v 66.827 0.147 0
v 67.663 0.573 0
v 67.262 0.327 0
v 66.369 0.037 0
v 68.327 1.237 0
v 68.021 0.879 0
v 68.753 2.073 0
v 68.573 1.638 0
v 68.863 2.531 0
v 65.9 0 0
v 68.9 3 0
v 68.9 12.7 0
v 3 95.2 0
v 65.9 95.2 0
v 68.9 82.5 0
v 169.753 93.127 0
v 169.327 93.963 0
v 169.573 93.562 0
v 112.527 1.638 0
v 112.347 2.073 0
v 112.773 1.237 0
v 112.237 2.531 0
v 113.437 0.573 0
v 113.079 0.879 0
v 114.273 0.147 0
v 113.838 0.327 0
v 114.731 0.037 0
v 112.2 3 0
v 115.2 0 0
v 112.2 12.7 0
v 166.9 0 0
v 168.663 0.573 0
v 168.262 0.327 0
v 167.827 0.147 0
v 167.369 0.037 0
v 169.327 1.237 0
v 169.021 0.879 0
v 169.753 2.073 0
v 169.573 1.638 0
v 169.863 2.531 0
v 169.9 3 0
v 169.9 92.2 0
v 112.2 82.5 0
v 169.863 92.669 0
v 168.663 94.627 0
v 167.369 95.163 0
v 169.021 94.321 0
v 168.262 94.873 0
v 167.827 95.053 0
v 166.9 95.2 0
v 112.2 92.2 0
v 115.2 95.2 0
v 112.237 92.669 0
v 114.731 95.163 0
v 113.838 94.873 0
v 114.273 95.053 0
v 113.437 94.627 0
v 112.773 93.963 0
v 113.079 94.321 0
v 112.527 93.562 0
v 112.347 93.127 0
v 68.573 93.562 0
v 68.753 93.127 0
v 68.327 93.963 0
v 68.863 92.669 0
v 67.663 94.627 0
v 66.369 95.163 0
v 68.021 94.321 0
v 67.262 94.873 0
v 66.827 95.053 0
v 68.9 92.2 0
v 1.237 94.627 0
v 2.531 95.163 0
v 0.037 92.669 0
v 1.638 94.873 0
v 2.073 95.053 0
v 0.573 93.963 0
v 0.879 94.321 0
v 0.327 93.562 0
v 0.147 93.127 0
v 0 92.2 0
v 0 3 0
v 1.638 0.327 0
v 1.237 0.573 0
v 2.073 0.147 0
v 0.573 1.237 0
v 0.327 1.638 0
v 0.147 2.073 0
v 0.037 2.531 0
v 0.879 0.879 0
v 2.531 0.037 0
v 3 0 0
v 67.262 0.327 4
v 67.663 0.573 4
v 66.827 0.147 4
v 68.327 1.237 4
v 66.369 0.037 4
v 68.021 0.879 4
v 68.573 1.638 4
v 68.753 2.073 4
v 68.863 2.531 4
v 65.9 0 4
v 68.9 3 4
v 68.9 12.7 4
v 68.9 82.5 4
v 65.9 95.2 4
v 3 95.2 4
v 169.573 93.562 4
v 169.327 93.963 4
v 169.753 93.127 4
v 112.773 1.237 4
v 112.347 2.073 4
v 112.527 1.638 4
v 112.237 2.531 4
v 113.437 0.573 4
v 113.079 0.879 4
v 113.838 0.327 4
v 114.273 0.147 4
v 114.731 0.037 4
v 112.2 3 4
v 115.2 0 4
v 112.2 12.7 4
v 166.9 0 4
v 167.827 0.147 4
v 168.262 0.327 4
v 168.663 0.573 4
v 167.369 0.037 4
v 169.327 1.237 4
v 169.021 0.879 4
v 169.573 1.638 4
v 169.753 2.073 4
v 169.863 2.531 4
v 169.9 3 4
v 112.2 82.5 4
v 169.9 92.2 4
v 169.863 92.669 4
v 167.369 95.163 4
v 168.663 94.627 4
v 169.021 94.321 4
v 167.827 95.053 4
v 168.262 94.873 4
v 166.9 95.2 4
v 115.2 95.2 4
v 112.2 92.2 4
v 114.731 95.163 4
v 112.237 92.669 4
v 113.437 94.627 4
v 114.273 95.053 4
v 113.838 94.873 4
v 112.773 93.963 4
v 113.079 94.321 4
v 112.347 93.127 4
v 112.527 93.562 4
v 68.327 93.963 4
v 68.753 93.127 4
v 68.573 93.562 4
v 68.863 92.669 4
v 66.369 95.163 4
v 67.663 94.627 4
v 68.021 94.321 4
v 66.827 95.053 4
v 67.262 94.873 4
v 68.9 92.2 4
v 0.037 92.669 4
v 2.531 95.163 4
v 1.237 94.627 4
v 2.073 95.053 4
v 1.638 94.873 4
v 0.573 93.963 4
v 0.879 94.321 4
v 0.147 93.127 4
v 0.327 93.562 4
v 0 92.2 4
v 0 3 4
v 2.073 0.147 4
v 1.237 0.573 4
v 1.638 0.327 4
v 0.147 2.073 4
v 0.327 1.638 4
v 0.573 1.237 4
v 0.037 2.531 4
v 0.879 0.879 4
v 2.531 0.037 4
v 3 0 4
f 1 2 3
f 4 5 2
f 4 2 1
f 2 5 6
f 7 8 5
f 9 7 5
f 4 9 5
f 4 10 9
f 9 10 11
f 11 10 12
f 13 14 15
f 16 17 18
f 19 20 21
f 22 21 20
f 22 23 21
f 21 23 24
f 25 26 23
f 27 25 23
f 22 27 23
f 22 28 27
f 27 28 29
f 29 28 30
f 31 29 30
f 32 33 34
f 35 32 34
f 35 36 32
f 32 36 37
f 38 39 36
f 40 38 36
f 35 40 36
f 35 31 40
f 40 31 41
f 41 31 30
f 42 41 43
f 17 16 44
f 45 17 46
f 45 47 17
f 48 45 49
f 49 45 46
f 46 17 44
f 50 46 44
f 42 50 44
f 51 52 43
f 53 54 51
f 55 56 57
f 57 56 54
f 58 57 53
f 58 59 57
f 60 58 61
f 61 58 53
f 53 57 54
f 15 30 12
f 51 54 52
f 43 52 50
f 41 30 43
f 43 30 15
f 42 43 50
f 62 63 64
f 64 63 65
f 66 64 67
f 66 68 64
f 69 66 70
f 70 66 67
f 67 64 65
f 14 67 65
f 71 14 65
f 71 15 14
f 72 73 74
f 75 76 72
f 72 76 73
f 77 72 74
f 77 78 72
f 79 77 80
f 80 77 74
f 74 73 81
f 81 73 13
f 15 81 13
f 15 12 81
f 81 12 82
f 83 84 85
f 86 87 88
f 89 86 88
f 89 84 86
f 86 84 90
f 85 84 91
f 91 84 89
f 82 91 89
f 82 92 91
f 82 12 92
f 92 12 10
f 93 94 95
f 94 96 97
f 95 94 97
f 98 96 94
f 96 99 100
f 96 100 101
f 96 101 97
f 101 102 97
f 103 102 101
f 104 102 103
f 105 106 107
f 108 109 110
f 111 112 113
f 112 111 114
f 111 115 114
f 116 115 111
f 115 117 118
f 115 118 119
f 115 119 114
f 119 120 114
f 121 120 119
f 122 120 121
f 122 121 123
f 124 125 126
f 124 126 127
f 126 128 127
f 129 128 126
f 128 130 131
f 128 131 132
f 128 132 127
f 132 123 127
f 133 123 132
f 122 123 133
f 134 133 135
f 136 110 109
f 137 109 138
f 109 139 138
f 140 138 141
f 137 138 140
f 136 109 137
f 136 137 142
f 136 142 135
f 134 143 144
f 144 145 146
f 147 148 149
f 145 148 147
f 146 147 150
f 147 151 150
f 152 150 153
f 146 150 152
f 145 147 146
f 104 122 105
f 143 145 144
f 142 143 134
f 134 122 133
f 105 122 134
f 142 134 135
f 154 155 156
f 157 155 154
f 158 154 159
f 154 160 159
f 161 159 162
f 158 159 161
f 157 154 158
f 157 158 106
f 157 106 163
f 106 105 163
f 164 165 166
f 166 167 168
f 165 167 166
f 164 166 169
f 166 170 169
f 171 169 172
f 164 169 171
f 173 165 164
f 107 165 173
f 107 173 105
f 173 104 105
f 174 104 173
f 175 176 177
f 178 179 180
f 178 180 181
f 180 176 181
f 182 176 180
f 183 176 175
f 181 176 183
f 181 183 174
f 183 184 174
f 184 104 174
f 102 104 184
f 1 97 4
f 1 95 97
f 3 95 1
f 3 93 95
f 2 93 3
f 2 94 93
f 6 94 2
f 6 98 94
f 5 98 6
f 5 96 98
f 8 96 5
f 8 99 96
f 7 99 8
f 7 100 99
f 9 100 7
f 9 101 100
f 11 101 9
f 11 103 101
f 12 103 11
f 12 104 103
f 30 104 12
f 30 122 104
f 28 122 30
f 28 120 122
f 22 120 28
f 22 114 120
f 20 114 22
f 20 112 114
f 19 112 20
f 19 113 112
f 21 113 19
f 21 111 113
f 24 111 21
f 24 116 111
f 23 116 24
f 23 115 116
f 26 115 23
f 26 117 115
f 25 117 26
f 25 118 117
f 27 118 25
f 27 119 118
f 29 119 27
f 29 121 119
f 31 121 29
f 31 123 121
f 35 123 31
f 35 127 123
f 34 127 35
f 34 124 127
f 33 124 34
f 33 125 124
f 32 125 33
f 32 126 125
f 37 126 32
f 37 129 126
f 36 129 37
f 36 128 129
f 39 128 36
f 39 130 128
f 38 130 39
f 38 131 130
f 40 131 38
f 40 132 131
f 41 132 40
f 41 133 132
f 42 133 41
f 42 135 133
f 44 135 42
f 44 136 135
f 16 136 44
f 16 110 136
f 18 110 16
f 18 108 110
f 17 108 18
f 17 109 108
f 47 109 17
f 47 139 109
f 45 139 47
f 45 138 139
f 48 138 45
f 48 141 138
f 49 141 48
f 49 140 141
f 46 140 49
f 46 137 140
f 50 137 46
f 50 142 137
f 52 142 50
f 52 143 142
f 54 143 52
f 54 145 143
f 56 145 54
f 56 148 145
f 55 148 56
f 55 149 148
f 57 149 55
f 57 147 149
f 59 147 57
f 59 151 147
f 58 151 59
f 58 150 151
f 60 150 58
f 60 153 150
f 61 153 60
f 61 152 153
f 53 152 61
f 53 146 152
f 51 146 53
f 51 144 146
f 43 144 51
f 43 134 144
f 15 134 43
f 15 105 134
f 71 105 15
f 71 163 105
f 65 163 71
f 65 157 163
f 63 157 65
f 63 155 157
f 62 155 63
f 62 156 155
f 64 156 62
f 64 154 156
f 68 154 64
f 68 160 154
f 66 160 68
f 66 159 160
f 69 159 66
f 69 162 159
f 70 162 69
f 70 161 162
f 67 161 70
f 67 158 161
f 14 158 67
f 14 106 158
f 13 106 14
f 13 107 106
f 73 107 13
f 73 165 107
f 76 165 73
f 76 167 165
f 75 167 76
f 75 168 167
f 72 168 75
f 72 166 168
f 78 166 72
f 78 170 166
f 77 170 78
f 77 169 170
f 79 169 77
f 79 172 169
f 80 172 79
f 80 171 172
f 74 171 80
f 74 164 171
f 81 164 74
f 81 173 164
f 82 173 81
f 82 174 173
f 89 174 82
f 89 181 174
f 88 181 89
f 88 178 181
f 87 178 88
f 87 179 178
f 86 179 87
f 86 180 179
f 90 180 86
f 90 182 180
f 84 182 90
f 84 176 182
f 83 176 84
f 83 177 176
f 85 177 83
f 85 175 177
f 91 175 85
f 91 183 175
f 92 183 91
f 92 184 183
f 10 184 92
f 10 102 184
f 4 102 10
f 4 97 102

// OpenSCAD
$fn = 40;

// ============================================================
// BASE PLATE DIMENSIONS
// ============================================================
part_outer_width = 95.2;
part_inner_width = 69.8;

part_left_length_raw   = 69.9;
part_center_length_raw = 41.3;
part_right_length_raw  = 58.7;

left_trim  = 1;
right_trim = 1;

part_left_length  = part_left_length_raw  - left_trim;
part_right_length = part_right_length_raw - right_trim;

part_total_length = part_left_length_raw + part_center_length_raw + part_right_length_raw;
part_center_length = part_total_length - part_left_length - part_right_length;

// ============================================================
// CORNER ROUNDING
// ============================================================
profile_corner_radius = 3;

// ============================================================
// FOOTPRINTS / SECTION PLACEMENT
// ============================================================
left_section_size   = [part_left_length, part_outer_width];
right_section_size  = [part_right_length, part_outer_width];
center_section_size = [part_center_length, part_inner_width];

center_section_x = left_section_size[0];
center_section_y_offset = (part_outer_width - part_inner_width) / 2;
right_section_x = left_section_size[0] + center_section_size[0];

// ============================================================
// 2D HELPERS
// ============================================================
module rect_2d(sz) {
    square(sz, center = false);
}

module rounded_shape_2d(r) {
    offset(r = r)
        offset(delta = -r)
            children();
}

// ============================================================
// 2D BASE PROFILE
// ============================================================
module base_profile_2d() {
    union() {
        rect_2d(left_section_size);

        translate([center_section_x, center_section_y_offset])
            rect_2d(center_section_size);

        translate([right_section_x, 0])
            rect_2d(right_section_size);
    }
}

module rounded_base_profile_2d(r = profile_corner_radius) {
    rounded_shape_2d(r)
        base_profile_2d();
}

// ============================================================
// 3D BASE PLATE
// ============================================================
module base_3d(thickness = 4, corner_radius = profile_corner_radius) {
    linear_extrude(height = thickness)
        rounded_base_profile_2d(corner_radius);
}

// ============================================================
// EXAMPLE USAGE
// ============================================================
// base_3d();              // default 4 mm thick
// base_3d(10);            // 10 mm thick
// base_3d(6, 2);          // 6 mm thick with 2 mm corner radius

base_3d();
